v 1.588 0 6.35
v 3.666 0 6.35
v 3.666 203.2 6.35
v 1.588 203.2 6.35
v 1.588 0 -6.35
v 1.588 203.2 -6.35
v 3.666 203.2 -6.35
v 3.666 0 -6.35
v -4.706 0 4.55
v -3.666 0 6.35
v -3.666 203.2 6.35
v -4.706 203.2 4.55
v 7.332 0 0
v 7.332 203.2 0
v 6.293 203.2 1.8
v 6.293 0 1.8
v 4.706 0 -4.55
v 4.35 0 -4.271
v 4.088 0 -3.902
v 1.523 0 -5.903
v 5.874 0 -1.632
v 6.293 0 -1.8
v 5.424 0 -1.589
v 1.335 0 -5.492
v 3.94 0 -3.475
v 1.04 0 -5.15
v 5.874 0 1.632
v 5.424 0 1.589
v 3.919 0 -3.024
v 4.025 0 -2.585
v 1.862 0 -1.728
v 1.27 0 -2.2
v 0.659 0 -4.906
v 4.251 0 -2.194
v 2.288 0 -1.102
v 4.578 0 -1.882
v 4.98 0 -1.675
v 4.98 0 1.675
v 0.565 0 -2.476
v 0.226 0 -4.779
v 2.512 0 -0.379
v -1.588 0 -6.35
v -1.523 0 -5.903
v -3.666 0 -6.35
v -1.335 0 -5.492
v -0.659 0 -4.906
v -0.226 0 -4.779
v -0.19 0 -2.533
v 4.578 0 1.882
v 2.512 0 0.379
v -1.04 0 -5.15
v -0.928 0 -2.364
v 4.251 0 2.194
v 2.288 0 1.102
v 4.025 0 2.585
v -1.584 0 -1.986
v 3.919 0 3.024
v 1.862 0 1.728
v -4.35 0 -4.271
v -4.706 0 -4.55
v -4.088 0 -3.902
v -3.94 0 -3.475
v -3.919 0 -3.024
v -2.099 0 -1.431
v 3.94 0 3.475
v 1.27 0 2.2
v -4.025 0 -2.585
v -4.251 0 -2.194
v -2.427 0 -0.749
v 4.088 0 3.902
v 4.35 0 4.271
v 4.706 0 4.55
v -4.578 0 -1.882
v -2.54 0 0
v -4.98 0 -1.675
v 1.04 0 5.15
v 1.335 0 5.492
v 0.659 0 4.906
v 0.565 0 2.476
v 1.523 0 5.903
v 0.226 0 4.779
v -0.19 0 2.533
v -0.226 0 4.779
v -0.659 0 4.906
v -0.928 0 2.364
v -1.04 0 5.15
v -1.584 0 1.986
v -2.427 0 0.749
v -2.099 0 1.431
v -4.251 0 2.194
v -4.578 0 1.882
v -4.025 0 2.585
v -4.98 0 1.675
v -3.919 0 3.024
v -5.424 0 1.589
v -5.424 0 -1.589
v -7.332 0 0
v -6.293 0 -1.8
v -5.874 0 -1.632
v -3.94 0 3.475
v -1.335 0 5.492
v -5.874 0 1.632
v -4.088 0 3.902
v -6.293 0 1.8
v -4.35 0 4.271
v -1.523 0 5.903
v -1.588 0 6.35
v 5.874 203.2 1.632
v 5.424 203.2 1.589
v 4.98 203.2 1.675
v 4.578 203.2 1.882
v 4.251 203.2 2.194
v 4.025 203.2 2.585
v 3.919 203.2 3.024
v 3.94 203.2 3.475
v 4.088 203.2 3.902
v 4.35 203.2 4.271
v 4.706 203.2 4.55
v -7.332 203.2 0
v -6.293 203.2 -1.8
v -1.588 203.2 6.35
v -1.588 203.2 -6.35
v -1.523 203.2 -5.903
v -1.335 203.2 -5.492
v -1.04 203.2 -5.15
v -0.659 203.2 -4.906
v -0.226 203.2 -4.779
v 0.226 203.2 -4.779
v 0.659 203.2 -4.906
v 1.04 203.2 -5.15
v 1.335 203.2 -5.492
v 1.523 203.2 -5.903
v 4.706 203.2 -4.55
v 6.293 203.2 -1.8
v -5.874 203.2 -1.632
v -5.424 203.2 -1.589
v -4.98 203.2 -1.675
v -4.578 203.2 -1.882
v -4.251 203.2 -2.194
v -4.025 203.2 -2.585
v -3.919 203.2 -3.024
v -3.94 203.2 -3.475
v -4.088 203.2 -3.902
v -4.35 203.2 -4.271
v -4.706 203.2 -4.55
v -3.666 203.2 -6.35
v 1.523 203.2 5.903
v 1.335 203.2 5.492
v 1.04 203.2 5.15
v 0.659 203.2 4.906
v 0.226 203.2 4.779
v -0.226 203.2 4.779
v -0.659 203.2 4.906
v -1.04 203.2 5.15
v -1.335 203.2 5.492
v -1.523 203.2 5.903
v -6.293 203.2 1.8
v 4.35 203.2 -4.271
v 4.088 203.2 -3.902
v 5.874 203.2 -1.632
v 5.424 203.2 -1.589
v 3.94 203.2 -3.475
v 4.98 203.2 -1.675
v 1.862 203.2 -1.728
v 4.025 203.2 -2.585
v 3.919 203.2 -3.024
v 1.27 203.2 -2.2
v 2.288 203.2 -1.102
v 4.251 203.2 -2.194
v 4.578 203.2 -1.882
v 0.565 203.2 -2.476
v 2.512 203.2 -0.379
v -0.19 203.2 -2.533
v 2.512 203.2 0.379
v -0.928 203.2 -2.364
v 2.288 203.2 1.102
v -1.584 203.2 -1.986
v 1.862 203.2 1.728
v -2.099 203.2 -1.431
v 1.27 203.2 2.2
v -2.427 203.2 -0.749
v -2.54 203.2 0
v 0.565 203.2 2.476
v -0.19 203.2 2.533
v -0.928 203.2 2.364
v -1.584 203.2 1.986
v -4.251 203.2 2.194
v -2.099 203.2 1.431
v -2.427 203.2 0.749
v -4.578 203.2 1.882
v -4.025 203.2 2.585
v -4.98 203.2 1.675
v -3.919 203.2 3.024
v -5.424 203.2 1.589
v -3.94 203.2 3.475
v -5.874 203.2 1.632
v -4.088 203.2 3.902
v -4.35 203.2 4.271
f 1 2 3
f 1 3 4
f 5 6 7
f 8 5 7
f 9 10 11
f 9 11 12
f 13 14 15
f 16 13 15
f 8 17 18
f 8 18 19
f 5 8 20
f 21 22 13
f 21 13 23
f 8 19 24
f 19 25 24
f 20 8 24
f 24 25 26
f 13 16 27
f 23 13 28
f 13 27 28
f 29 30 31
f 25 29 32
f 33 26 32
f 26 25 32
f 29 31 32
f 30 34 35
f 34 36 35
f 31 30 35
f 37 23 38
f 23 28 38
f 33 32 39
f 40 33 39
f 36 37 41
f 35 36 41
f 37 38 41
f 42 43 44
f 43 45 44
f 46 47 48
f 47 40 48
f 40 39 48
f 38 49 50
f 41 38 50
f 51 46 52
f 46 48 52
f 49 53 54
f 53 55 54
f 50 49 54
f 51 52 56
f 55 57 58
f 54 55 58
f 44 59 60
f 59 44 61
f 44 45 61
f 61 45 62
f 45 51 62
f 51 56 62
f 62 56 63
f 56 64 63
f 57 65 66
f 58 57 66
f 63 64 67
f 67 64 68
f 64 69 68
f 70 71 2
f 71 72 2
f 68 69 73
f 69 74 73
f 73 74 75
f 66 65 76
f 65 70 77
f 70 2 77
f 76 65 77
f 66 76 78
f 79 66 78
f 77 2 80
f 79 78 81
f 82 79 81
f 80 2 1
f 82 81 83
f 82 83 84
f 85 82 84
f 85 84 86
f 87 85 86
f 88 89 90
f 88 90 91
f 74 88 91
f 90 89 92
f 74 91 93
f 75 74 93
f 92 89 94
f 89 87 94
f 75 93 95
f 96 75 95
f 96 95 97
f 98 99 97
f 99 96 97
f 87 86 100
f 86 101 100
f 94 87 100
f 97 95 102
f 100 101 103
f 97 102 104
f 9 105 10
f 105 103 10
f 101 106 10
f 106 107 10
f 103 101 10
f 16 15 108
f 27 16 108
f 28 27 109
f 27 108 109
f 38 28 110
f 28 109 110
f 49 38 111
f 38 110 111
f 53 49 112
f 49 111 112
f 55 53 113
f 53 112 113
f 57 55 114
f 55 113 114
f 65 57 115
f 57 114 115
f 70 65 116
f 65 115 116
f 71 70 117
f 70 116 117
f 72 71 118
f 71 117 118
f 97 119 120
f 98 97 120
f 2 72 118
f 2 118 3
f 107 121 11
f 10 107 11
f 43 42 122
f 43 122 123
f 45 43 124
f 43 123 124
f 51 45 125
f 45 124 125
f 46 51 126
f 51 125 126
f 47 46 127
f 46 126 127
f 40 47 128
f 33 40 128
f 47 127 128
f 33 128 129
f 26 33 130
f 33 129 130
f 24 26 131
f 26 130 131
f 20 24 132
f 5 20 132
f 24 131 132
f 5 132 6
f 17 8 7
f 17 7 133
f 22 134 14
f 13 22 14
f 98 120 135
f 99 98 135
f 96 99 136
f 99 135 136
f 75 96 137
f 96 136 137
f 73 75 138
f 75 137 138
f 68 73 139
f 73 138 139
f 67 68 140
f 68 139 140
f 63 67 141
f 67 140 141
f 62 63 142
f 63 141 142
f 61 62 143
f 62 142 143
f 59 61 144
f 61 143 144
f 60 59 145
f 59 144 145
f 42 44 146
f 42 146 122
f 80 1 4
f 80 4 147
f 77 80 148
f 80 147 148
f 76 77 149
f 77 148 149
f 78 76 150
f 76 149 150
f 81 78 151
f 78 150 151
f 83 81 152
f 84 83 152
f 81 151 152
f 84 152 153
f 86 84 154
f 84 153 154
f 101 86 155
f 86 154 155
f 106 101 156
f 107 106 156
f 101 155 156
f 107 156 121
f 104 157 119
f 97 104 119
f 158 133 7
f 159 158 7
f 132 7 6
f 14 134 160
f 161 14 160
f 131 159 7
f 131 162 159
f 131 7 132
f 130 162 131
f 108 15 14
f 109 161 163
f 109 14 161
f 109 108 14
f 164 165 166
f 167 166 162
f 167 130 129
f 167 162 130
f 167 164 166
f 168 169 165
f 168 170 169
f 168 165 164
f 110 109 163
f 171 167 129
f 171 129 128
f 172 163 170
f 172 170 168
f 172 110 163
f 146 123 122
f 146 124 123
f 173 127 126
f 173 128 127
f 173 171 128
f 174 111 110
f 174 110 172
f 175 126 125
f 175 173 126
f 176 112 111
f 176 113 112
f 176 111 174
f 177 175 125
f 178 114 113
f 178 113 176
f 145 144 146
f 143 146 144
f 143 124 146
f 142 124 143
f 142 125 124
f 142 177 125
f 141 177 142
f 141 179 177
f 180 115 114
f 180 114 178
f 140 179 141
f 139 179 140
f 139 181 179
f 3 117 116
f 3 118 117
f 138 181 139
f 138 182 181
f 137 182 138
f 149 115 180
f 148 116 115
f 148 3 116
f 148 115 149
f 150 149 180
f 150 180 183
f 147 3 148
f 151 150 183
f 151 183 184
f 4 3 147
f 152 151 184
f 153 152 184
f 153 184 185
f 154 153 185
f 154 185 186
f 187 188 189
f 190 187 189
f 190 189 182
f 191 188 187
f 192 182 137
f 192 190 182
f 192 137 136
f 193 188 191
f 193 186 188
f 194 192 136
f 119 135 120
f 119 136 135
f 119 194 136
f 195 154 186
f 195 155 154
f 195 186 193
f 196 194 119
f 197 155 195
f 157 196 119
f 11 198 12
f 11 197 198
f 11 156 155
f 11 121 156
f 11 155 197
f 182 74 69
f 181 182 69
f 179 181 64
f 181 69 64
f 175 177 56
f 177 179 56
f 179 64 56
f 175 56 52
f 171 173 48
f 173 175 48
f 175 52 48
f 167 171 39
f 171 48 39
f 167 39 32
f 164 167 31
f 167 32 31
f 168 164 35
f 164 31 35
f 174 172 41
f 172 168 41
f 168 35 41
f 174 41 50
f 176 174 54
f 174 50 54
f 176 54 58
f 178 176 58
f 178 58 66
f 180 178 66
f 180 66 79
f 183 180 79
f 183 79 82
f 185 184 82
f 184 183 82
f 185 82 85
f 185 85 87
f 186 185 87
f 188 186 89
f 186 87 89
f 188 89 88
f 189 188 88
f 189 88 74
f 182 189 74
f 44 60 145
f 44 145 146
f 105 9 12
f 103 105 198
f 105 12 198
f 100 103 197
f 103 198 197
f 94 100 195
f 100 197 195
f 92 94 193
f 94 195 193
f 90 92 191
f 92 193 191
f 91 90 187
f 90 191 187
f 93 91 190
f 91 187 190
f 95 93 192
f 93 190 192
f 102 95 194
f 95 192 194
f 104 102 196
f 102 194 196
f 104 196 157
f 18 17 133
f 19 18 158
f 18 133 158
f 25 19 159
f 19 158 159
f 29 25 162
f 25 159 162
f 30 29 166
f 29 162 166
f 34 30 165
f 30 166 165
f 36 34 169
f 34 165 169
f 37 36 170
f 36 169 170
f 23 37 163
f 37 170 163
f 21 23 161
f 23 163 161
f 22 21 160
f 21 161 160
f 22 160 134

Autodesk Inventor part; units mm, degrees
ref_plane "YZ Plane" through (0, 0, 0) normal (1, 0, 0) x (0, 1, 0)
ref_plane "XZ Plane" through (0, 0, 0) normal (0, 1, 0) x (-1, 0, 0)
ref_plane "XY Plane" through (0, 0, 0) normal (0, 0, 1) x (1, 0, 0)
sketch "Sketch1" plane through (0, 0, 0) normal (0, 1, 0) x (-1, 0, 0)
  line L0 (-3.6662, 6.35) -> (3.6662, 6.35)
  line L1 (3.6662, 6.35) -> (7.3323, 0)
  line L2 (7.3323, 0) -> (3.6662, -6.35)
  line L3 (3.6662, -6.35) -> (-3.6662, -6.35)
  line L4 (-3.6662, -6.35) -> (-7.3323, 0)
  line L5 (-7.3323, 0) -> (-3.6662, 6.35)
  circle A0 centre (0, 0) radius 2.54
  dimension "d0" = 12.7
  dimension "d1" = 5.08
extrude "Extrusion1" add sketch "Sketch1" along normal blind 203.2
sketch "Sketch2" plane through (0, 203.2, 0) normal (0, 1, 0) x (1, 0, 0)
  line L0 (-3.6662, 6.35) -> (3.6662, 6.35) projected
  arc A0 (-1.5875, 6.35) -> (1.5875, 6.35) centre (0, 6.35) ccw
  line L1 (-1.5875, 6.35) -> (1.5875, 6.35)
  dimension "d4" = 1.5875
extrude "Extrusion2" cut sketch "Sketch2" against normal through all
pattern_circular "Circular Pattern1" count 6 over 360 about axis through (0, 0, 0) along (0, 1, 0) of "Extrusion2"
properties part number "HopperGuide2" material "Aluminum-6061"
